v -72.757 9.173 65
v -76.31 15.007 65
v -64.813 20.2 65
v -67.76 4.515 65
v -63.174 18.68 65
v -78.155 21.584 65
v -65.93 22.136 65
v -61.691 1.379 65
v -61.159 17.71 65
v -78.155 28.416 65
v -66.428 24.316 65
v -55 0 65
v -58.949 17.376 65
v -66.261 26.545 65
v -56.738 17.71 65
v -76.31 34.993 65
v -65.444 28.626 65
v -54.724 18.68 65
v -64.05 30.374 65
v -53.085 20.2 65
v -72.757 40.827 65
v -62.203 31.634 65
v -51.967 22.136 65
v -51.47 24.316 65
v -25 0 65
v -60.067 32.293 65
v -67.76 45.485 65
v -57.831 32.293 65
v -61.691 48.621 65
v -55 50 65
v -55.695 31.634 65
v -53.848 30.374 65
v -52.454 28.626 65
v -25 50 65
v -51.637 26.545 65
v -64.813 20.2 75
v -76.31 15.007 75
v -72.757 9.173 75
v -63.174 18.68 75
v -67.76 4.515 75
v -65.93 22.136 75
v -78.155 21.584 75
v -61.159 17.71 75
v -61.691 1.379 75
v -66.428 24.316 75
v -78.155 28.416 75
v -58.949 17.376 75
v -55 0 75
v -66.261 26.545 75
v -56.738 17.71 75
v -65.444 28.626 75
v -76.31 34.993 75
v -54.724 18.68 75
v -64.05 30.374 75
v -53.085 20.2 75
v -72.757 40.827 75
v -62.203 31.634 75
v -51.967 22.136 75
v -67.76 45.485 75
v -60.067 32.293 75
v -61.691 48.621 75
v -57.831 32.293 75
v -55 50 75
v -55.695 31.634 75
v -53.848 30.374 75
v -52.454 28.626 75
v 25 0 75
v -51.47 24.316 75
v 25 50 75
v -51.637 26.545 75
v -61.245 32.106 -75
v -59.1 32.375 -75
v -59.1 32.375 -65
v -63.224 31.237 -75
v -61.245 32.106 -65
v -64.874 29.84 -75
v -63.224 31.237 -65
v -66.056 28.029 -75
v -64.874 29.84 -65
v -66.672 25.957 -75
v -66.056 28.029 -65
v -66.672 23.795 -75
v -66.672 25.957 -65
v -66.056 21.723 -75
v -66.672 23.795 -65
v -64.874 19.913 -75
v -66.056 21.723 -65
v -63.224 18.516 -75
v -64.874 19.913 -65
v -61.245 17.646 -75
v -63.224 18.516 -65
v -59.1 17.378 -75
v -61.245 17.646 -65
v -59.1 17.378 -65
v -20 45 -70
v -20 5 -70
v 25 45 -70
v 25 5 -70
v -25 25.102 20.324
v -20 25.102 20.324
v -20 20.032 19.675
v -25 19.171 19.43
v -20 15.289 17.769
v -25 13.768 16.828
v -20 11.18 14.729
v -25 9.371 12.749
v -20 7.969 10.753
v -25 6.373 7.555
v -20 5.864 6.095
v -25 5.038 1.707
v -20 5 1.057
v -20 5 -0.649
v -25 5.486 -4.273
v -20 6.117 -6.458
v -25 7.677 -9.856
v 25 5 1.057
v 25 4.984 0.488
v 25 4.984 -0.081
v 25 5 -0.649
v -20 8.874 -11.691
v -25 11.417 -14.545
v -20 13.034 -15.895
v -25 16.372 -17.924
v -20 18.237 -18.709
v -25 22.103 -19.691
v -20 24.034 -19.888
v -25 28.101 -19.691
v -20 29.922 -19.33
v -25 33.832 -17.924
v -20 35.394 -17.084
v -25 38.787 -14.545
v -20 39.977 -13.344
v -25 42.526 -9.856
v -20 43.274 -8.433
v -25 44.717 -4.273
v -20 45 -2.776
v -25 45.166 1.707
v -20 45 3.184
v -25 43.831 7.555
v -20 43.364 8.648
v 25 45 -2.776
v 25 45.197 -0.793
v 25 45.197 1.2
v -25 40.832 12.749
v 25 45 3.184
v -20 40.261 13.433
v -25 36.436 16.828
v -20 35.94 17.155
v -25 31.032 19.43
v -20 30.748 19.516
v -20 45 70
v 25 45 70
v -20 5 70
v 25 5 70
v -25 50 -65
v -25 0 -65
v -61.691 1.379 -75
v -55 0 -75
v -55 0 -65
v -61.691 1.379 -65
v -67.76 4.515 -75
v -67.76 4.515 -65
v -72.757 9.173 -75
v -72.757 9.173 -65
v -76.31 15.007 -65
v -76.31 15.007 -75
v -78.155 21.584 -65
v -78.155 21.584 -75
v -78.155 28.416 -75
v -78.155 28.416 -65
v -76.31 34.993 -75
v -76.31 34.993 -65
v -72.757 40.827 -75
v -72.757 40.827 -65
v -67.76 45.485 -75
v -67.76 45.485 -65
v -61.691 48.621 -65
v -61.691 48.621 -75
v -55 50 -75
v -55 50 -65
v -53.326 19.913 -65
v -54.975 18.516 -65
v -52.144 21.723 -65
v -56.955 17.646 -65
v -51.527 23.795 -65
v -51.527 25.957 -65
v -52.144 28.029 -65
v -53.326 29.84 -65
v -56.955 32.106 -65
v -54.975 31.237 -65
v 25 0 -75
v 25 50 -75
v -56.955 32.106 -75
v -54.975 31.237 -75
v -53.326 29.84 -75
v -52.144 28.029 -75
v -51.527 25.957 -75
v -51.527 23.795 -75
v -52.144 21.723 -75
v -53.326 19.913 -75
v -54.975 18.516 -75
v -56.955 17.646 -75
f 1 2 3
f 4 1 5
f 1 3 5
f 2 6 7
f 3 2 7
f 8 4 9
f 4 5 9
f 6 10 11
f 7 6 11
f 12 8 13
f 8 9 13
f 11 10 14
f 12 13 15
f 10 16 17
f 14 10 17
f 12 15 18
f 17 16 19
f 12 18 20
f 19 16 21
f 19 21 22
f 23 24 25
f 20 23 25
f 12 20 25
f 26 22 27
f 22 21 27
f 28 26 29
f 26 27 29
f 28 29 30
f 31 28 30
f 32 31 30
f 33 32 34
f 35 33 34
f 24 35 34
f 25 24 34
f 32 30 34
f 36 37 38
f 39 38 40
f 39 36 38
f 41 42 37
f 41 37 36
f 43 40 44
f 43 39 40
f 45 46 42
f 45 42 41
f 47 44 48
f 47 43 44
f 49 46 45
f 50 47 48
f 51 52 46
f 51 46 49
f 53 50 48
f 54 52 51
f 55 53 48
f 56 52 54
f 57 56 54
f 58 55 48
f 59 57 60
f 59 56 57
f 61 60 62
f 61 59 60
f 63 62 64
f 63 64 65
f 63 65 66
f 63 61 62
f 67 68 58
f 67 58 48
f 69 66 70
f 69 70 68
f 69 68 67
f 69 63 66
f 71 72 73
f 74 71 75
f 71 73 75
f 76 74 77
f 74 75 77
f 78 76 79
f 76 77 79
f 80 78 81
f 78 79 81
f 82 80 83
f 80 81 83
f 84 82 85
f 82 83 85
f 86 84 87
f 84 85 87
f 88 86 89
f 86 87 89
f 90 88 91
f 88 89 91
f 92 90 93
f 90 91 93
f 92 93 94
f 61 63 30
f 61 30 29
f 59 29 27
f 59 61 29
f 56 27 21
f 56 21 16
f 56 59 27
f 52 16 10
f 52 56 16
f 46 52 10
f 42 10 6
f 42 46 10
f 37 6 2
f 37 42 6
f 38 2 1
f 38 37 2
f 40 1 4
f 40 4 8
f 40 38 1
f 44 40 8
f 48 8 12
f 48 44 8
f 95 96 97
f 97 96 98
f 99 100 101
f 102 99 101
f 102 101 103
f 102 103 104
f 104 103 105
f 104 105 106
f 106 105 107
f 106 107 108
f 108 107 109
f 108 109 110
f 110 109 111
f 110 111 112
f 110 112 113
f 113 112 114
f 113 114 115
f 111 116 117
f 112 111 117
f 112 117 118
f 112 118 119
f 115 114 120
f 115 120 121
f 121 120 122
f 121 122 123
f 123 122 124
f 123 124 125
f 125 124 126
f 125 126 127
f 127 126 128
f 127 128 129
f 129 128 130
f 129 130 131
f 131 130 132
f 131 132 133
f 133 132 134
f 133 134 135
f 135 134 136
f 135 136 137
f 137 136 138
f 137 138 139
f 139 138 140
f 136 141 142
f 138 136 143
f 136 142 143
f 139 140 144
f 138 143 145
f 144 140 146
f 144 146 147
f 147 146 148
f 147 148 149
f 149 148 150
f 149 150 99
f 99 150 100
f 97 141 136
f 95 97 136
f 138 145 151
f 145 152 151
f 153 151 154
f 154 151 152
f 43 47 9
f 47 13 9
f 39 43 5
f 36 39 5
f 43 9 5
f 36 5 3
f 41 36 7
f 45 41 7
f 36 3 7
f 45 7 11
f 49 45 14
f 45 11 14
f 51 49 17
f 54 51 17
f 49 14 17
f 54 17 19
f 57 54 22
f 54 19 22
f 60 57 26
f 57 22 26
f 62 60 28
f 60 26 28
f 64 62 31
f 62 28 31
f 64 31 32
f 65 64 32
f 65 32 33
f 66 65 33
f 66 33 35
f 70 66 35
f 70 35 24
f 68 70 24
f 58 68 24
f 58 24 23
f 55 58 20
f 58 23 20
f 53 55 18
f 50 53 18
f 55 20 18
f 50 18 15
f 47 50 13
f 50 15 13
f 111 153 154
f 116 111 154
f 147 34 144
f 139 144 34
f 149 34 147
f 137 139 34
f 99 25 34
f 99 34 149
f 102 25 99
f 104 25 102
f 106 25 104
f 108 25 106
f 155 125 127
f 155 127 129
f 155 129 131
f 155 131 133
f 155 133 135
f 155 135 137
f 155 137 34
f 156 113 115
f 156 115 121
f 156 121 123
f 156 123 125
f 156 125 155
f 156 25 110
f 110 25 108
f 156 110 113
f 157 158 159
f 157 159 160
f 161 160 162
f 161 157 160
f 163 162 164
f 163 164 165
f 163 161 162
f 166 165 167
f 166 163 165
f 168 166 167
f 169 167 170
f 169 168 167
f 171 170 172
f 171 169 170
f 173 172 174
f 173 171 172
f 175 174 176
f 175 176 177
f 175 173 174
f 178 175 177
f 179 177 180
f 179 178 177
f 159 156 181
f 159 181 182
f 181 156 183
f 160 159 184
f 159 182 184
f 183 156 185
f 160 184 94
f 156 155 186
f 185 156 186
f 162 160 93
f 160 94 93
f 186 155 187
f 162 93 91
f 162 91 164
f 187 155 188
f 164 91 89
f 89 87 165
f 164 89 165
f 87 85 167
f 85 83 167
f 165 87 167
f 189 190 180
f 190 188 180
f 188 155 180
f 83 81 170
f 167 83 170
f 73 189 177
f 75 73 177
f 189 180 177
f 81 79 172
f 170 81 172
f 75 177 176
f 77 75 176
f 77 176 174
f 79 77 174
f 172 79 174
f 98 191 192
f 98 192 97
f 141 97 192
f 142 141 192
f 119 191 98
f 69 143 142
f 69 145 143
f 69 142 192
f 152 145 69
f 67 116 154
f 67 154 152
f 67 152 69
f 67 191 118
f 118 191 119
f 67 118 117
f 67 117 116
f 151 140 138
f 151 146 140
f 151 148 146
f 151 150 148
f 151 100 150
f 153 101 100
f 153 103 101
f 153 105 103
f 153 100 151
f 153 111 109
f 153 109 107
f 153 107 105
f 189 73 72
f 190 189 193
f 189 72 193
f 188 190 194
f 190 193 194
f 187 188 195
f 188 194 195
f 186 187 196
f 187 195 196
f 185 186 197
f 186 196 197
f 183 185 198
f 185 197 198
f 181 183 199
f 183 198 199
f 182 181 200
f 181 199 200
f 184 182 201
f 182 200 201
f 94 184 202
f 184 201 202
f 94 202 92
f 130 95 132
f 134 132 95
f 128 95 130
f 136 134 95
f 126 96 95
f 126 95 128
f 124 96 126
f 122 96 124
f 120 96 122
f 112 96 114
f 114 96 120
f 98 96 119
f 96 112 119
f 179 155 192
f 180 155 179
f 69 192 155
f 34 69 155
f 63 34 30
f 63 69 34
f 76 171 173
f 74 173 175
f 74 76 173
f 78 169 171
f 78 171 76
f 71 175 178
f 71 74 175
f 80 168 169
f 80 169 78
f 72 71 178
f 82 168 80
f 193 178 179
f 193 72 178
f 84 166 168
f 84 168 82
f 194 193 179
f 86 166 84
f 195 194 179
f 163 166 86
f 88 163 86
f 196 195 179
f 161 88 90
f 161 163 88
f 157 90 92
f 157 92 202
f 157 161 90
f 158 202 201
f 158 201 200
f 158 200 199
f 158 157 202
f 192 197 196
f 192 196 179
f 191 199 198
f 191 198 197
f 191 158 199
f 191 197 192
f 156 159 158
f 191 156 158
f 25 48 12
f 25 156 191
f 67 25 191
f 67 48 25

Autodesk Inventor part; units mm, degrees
ref_plane "YZ Plane" through (0, 0, 0) normal (1, 0, 0) x (0, 1, 0)
ref_plane "XZ Plane" through (0, 0, 0) normal (0, 1, 0) x (-1, 0, 0)
sketch "Boceto1" plane through (0, 0, 0) normal (0, 1, 0) x (-1, 0, 0)
  line L0 (-25, 75) -> (25, 75)
  line L1 (25, 75) -> (25, -75)
  line L2 (25, -75) -> (-25, -75)
  line L3 (-25, -75) -> (-25, 75)
  line L4 (-25, 75) -> (25, -75) construction
  line L5 (25, 75) -> (-25, -75) construction
  point P0 (0, 0)
  dimension "d0" = 50
  dimension "d1" = 150
extrude "Extrusión1" add sketch "Boceto1" along normal blind 50
sketch "Boceto2" plane through (25, 0, -75) normal (0, 0, -1) x (-1, 0, 0)
  line L0 (50, 50) -> (0, 50) projected
  line L1 (50, 50) -> (80, 50)
  line L2 (0, 0) -> (50, 0) projected
  line L3 (50, 0) -> (80, 0)
  arc A0 (80, 0) -> (80, 50) centre (78.3333, 25) ccw
  line L4 (50, 0) -> (50, 50) projected
  line L5 (50, 50) -> (50, 0)
  point P0 (25, 0)
  dimension "d4" = 30
  dimension "d5" = 30
extrude "Extrusión2" add sketch "Boceto2" against normal blind 10
ref_plane "Plano de trabajo1" through (0, 25, 0) normal (0, 1, 0) x (1, 0, 0)
sketch "Boceto3" plane through (25, 0, -75) normal (0, 0, -1) x (-1, 0, 0)
  point P0 (25, 0)
  point P1 (84.2508, 24.8764)
hole "Agujero1" at (-59.2508, 24.8764, -75) direction (0, 0, 1) diameter 15 end through all
sketch "Boceto4" plane through (-25, 0, 75) normal (0, 0, 1) x (1, 0, 0)
  arc A0 (-30, 50) -> (-30, 0) centre (-28.3333, 25) ccw projected
  line L0 (0, 50) -> (-30, 50) projected
  line L1 (-30, 0) -> (0, 0) projected
  line L2 (0, 0) -> (0, 50) projected
  point P0 (25, 0)
extrude "Extrusión3" add sketch "Boceto4" against normal blind 10
sketch "Boceto5" plane through (25, 0, 75) normal (0, 0, 1) x (1, 0, 0)
  point P0 (-25, 0)
  point P1 (-83.9488, 24.8764)
hole "Agujero2" at (-58.9488, 24.8764, 75) direction (0, 0, -1) diameter 15 end through all
sketch "Boceto6" plane through (25, 0, 75) normal (1, 0, 0) x (0, 0, -1)
  point P0 (75, 0)
shell "Vaciado1" thickness 5 removed faces 1 at (25, 16.6667, -25)
sketch "Boceto7" plane through (-25, 0, -65) normal (-1, 0, 0) x (0, 0, 1)
  point P0 (65, 0)
  point P1 (65.2039, 25.1019)
hole "Agujero3" at (-25, 25.1019, 0.2039) direction (1, 0, 0) diameter 40.24 end through all
properties part number "primer rotor"
